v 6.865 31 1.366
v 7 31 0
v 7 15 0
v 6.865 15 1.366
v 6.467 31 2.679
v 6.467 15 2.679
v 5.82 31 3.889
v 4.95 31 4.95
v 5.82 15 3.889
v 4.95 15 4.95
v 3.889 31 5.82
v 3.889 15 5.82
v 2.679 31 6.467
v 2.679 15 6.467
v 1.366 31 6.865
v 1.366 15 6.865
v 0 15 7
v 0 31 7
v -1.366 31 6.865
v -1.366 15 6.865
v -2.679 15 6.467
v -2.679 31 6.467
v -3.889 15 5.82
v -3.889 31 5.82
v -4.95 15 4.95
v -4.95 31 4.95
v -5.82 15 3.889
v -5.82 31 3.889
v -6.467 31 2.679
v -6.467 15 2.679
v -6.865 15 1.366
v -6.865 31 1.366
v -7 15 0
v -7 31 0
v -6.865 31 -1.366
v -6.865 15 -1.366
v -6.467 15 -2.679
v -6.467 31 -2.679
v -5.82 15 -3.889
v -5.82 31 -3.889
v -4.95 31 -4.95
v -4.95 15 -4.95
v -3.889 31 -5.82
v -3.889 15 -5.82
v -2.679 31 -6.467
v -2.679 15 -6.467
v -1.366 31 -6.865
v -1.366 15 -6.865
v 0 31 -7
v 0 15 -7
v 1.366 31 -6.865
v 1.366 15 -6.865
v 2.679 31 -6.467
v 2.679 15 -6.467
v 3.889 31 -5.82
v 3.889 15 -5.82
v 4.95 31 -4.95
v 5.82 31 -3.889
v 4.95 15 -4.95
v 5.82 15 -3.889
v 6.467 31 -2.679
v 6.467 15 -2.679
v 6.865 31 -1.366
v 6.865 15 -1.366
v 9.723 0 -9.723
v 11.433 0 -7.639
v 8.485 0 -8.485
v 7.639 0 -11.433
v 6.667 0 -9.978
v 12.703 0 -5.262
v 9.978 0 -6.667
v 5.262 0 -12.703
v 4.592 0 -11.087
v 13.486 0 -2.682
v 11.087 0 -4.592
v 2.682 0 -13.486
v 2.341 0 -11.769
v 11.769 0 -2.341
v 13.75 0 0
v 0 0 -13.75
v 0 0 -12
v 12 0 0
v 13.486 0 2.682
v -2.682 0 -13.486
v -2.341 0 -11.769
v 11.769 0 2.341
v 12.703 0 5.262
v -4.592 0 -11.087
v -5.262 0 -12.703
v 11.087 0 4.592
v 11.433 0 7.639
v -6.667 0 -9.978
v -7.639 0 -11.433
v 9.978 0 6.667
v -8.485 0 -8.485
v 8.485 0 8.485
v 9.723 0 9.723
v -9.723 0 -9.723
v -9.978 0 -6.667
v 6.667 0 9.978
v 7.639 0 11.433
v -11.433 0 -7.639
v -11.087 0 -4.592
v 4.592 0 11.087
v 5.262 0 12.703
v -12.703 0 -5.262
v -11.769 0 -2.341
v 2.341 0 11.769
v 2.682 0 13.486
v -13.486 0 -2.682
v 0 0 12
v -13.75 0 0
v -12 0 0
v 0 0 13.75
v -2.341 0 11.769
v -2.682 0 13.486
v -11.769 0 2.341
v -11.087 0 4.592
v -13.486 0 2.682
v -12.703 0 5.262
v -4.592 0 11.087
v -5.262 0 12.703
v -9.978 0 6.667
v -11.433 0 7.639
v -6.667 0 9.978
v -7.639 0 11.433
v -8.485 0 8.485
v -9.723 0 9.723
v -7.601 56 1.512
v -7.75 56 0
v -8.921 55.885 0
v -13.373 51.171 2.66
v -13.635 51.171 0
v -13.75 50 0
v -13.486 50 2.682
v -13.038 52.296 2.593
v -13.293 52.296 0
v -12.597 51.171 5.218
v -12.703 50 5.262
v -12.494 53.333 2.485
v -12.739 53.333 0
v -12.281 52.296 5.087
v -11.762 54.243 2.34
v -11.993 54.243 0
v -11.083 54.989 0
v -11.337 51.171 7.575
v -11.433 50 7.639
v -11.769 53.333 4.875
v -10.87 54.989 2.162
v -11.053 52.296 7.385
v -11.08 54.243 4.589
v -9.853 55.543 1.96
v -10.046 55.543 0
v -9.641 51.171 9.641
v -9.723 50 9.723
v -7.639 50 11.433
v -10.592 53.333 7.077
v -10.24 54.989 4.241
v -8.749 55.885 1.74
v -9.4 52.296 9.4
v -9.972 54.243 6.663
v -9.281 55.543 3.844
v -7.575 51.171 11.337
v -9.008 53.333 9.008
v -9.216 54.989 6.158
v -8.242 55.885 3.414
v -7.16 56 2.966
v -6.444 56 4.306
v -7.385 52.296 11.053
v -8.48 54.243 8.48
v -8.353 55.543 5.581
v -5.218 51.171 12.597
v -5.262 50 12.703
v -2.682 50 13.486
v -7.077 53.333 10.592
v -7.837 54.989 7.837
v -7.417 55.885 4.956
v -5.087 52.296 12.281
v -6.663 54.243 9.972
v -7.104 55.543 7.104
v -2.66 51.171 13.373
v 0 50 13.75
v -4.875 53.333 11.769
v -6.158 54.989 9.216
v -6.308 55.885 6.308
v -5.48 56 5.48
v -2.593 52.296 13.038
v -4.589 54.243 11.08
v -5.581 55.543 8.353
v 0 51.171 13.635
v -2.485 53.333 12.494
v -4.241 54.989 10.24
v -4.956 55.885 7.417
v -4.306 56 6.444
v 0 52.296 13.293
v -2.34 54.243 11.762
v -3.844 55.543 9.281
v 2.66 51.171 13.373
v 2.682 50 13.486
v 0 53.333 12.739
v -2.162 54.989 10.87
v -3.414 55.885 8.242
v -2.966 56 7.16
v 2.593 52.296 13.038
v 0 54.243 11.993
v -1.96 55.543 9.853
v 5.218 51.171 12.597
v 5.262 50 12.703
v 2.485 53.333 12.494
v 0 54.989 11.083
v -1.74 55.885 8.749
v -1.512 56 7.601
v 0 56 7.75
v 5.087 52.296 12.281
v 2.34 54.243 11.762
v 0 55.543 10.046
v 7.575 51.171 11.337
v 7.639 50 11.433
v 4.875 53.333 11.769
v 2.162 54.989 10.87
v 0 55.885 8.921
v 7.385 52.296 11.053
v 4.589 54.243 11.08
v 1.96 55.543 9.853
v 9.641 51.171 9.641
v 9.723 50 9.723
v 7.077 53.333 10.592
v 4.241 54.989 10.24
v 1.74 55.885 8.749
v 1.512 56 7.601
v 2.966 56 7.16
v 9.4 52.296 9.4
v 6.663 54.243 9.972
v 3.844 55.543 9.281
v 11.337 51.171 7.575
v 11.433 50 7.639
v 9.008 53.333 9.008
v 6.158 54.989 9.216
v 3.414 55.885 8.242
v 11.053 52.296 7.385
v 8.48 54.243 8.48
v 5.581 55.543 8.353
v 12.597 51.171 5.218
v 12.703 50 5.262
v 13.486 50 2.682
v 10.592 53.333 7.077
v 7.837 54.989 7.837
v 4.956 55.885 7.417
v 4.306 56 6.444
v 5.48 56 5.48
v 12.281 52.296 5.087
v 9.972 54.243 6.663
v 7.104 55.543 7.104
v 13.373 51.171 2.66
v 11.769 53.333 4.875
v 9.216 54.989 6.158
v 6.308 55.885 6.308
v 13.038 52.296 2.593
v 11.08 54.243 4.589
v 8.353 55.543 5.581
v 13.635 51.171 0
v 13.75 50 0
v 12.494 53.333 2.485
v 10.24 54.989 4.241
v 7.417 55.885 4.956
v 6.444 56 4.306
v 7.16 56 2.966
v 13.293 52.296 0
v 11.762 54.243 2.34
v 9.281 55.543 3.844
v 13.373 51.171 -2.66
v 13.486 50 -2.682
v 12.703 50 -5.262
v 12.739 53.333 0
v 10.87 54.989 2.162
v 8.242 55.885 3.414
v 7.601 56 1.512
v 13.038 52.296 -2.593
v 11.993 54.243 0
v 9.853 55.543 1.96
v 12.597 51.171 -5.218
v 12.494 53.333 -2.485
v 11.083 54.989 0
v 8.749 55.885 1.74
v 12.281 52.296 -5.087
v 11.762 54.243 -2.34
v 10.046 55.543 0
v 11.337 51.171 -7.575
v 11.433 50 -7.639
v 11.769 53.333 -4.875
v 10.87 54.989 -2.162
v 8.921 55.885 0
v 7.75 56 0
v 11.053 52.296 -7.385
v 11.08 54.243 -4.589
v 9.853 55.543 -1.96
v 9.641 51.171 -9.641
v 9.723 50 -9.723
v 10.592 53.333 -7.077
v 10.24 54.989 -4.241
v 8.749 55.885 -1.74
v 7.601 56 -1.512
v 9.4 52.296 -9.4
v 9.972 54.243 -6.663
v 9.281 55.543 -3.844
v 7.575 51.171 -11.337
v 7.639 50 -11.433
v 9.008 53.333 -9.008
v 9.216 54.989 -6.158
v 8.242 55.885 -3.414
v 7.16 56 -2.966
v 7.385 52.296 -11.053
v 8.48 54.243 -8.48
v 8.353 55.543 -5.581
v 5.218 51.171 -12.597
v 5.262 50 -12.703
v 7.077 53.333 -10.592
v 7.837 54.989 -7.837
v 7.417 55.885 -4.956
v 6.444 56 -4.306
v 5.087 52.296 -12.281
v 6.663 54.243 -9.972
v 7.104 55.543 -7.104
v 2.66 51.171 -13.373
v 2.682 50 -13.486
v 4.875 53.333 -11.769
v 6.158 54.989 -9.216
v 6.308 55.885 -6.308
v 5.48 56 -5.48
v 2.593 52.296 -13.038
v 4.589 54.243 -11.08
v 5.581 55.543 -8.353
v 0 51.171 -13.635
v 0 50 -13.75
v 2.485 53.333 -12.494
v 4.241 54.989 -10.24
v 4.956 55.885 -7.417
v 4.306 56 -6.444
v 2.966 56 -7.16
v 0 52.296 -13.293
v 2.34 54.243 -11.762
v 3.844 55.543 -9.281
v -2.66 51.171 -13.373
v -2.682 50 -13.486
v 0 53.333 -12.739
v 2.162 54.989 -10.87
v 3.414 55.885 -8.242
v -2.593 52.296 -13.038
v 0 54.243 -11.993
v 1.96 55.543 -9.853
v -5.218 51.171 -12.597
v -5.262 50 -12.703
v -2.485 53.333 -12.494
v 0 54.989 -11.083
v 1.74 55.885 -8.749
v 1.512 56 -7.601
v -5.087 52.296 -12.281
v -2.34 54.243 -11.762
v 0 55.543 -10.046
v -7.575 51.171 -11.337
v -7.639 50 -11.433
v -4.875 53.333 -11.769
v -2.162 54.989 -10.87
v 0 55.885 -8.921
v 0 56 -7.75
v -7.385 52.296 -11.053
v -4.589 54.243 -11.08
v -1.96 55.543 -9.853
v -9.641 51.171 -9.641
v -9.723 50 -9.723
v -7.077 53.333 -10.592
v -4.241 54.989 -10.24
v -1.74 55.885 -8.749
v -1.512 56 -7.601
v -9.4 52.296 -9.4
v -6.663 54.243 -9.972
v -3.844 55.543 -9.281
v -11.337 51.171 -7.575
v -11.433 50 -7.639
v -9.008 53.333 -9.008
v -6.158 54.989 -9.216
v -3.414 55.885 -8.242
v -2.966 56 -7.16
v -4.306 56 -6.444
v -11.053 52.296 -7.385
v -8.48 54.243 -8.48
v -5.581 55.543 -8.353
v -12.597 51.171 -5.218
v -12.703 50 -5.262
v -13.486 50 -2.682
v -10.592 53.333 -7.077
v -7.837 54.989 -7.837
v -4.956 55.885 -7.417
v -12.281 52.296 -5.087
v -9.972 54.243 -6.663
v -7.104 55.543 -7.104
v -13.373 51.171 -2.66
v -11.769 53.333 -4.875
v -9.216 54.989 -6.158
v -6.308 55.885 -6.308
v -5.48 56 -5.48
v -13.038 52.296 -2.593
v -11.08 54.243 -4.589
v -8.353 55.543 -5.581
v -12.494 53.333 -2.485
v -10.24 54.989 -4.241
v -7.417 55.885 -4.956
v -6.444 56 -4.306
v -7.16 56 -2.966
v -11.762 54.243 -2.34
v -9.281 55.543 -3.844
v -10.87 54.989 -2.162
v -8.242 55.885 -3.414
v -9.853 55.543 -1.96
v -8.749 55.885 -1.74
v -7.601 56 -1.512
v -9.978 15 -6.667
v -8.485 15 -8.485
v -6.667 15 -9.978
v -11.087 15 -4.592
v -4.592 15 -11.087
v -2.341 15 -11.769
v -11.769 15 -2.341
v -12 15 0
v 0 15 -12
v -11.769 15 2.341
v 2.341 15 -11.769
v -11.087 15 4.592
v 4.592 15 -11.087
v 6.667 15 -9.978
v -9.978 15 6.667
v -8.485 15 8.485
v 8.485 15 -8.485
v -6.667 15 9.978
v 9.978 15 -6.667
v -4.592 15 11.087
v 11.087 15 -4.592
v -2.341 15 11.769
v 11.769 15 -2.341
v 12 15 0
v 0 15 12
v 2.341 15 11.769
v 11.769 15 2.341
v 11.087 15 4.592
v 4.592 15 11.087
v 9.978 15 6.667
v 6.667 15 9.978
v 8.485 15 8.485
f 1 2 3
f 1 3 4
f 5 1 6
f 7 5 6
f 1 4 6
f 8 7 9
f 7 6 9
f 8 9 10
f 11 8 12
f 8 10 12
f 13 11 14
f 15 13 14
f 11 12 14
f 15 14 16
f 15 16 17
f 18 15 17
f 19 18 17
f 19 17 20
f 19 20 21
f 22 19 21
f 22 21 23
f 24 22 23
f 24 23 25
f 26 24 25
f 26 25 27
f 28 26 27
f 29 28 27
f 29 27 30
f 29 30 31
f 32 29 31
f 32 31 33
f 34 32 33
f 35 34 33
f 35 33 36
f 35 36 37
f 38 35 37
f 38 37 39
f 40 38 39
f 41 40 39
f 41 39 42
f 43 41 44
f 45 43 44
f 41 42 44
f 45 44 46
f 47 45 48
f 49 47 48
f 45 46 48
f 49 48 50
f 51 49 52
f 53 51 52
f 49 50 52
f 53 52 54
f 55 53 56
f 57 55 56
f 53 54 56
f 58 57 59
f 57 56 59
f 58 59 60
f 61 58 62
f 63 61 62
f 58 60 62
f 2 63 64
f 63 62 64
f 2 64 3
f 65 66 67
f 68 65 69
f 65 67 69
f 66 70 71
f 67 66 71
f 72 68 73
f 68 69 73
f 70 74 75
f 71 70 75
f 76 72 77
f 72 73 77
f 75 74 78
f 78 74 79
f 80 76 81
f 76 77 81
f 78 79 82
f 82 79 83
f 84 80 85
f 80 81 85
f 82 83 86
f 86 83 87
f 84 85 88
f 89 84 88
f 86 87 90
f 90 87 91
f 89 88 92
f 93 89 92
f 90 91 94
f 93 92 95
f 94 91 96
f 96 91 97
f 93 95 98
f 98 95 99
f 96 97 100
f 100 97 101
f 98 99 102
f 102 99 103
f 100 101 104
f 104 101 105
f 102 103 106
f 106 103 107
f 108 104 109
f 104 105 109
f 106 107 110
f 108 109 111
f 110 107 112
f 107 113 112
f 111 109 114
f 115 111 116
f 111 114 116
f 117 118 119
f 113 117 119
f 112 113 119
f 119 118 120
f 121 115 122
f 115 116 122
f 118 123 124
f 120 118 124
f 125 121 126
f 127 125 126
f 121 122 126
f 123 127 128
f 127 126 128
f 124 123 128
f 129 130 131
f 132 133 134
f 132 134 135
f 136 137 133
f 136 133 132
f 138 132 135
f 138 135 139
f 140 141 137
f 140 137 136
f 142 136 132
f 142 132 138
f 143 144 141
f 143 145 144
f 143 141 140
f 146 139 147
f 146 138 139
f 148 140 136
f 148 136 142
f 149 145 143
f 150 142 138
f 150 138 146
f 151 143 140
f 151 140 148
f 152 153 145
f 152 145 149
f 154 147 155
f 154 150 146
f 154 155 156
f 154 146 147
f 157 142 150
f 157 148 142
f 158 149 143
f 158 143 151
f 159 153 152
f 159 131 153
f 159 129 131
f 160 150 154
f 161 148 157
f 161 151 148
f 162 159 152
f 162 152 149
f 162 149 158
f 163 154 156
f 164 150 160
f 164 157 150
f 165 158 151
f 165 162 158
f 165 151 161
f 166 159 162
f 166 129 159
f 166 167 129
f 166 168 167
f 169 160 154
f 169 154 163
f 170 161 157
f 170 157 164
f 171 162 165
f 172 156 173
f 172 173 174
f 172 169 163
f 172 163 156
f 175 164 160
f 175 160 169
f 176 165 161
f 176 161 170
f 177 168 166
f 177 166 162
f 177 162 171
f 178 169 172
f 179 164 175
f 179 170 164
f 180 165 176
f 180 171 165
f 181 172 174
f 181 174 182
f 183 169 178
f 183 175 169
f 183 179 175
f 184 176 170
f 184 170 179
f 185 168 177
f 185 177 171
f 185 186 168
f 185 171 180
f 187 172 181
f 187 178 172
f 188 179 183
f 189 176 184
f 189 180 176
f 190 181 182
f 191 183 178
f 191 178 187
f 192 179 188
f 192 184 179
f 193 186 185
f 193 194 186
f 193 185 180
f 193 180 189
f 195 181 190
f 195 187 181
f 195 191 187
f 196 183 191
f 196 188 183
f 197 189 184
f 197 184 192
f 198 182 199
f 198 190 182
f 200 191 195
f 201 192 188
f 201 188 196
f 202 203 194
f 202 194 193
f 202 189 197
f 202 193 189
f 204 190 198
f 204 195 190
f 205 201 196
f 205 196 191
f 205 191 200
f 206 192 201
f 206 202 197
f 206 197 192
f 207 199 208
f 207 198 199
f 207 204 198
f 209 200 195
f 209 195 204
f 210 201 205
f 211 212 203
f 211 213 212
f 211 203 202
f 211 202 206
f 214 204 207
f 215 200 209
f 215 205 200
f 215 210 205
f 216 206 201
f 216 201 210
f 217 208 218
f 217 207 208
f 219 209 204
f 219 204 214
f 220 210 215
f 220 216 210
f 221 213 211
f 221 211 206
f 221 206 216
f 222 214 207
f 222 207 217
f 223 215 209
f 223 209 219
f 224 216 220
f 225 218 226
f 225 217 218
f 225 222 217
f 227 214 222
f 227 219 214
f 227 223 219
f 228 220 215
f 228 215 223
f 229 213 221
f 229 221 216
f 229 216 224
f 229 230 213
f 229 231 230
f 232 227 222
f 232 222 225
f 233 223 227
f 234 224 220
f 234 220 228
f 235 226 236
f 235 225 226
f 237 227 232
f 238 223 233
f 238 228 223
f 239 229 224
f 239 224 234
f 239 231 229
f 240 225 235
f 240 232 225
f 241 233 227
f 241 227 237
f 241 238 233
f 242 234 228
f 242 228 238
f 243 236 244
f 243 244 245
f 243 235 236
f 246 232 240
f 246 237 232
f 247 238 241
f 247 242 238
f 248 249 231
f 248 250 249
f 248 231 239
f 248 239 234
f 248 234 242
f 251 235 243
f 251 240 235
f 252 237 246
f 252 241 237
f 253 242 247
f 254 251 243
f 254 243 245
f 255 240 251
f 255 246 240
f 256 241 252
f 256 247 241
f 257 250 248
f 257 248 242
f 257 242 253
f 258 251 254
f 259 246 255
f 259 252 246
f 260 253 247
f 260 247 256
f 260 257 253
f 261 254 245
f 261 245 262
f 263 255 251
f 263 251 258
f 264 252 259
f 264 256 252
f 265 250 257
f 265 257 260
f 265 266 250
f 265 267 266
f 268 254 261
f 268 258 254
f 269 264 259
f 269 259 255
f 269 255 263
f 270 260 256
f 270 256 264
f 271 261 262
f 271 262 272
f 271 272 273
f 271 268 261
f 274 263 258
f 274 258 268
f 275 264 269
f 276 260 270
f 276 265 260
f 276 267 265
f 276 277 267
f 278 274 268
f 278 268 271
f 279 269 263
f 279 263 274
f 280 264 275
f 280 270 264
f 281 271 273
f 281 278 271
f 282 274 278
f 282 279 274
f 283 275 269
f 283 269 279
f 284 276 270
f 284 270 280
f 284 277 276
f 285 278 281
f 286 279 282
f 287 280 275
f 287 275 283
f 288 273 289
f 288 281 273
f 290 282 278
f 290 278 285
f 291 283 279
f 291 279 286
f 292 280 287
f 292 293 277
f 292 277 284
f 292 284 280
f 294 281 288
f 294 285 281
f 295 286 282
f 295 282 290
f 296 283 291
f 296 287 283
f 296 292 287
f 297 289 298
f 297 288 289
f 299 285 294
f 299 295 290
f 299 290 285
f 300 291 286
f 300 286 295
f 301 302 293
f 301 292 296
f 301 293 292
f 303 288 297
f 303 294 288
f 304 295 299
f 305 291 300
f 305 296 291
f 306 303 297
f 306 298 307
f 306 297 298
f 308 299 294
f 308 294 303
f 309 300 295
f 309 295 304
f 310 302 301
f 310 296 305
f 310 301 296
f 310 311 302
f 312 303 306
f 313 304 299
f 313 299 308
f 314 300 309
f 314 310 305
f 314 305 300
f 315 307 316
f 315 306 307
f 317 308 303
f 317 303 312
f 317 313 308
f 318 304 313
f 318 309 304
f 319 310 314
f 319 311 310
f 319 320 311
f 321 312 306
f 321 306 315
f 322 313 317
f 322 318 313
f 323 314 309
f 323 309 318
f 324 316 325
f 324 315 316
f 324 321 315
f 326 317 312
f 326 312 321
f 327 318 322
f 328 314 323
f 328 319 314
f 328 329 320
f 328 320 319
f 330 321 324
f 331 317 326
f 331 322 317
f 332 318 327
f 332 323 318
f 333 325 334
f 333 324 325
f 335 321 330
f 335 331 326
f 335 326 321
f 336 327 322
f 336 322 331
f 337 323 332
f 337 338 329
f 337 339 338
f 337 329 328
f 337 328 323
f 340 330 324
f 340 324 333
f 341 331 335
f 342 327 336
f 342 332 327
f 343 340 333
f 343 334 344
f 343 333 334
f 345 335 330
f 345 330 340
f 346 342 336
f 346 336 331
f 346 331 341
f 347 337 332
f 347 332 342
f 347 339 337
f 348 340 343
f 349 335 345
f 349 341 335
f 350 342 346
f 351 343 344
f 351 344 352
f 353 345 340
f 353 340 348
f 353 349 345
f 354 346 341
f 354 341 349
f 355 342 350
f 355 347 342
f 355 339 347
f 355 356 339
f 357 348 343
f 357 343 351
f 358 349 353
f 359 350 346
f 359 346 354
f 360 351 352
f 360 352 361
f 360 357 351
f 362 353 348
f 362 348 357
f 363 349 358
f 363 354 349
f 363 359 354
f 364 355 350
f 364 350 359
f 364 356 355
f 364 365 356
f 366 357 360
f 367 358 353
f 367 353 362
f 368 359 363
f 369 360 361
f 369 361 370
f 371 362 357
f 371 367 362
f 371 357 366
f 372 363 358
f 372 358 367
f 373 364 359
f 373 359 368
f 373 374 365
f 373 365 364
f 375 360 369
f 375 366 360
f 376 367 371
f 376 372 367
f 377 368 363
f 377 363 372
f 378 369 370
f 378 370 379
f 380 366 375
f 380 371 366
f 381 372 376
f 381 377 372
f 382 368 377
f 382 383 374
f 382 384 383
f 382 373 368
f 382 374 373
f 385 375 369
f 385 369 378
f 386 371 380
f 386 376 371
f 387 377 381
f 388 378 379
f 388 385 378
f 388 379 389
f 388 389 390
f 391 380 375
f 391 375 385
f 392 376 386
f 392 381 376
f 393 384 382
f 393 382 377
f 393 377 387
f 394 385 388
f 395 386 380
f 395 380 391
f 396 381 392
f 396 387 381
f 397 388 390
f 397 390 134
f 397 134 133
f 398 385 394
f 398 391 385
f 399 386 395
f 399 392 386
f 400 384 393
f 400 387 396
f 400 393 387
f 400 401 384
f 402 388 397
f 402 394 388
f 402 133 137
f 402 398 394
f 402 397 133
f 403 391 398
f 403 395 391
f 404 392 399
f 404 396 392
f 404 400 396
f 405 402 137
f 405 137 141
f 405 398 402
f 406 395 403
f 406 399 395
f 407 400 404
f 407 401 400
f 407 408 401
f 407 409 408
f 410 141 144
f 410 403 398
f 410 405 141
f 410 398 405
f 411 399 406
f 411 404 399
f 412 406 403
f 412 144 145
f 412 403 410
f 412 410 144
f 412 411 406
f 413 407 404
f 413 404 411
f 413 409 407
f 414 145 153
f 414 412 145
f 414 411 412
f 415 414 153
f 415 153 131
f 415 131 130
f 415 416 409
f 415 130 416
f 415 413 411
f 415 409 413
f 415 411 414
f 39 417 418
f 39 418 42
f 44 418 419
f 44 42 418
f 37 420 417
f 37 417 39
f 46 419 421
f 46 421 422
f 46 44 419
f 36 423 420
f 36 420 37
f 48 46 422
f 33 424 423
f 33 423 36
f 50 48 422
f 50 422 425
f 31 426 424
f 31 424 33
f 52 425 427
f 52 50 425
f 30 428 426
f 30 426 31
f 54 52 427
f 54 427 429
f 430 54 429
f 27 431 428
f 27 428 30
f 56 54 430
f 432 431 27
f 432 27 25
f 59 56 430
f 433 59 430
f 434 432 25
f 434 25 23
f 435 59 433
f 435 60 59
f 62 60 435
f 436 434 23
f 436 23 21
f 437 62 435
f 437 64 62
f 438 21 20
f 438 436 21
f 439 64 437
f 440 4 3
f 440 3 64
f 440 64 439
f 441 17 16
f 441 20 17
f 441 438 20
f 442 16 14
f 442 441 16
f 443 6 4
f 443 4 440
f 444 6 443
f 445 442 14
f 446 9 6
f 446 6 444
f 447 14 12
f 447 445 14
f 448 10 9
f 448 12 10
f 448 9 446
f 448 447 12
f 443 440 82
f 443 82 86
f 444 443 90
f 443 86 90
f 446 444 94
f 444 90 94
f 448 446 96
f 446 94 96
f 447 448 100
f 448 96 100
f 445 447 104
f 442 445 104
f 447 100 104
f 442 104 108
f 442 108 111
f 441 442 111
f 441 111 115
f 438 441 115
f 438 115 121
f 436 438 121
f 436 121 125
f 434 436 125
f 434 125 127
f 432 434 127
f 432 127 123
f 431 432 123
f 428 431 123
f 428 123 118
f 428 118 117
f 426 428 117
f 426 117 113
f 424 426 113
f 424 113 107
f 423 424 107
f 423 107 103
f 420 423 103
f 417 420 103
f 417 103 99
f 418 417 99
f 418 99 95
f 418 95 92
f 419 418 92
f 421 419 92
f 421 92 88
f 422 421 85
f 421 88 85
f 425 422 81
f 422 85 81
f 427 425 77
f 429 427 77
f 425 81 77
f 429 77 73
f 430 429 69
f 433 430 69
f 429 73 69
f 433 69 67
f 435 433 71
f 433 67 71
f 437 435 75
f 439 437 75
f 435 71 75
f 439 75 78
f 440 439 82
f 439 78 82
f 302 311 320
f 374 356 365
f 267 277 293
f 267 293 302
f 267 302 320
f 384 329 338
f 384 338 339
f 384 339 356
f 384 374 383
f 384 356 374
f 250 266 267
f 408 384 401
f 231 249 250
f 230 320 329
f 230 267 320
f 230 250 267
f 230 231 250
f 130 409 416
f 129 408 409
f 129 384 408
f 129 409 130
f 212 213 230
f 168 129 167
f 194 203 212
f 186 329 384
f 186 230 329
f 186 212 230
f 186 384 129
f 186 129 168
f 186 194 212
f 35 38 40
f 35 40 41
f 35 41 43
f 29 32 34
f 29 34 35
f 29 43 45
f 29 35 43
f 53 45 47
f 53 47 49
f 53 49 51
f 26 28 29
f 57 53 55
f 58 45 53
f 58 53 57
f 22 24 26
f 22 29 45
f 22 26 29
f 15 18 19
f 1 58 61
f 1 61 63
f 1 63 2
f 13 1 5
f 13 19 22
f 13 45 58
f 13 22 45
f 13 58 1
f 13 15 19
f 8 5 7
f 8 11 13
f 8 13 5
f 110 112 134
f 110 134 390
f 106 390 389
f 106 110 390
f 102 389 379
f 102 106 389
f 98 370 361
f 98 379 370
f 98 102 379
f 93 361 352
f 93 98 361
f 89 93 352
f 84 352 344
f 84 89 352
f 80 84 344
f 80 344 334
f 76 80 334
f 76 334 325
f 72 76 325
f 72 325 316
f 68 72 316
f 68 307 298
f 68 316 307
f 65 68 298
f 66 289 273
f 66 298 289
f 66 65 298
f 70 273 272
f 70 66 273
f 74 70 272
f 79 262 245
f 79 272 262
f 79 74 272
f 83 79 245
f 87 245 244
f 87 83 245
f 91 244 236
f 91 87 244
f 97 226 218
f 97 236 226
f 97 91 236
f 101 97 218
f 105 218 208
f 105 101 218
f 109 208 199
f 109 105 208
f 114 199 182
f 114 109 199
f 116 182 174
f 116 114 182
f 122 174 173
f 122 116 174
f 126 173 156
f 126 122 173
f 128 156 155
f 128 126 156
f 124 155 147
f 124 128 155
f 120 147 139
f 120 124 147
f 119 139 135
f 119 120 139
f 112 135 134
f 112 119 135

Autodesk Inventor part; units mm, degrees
ref_plane "YZ Plane" through (0, 0, 0) normal (1, 0, 0) x (0, 1, 0)
ref_plane "XZ Plane" through (0, 0, 0) normal (0, 1, 0) x (-1, 0, 0)
ref_plane "XY Plane" through (0, 0, 0) normal (0, 0, 1) x (1, 0, 0)
sketch "Sketch1" plane through (0, 0, 0) normal (0, 1, 0) x (-1, 0, 0)
  circle A0 centre (0, 0) radius 13.75
  dimension "d0" = 27.5
extrude "Extrusion1" add sketch "Sketch1" along normal blind 56
fillet "Fillet1" radius 6 1 edges at (13.75, 56, 0)
sketch "Sketch2" plane through (0, 0, 0) normal (0, -1, 0) x (1, 0, 0)
  circle A0 centre (0, 0) radius 12
  dimension "d4" = 24
extrude "Extrusion2" cut sketch "Sketch2" against normal blind 15
sketch "Sketch3" plane through (0, 15, 0) normal (0, -1, 0) x (1, 0, 0)
  circle A0 centre (0, 0) radius 7
  dimension "d7" = 14
extrude "Extrusion3" cut sketch "Sketch3" against normal blind 16
properties part number "E14 socket"
